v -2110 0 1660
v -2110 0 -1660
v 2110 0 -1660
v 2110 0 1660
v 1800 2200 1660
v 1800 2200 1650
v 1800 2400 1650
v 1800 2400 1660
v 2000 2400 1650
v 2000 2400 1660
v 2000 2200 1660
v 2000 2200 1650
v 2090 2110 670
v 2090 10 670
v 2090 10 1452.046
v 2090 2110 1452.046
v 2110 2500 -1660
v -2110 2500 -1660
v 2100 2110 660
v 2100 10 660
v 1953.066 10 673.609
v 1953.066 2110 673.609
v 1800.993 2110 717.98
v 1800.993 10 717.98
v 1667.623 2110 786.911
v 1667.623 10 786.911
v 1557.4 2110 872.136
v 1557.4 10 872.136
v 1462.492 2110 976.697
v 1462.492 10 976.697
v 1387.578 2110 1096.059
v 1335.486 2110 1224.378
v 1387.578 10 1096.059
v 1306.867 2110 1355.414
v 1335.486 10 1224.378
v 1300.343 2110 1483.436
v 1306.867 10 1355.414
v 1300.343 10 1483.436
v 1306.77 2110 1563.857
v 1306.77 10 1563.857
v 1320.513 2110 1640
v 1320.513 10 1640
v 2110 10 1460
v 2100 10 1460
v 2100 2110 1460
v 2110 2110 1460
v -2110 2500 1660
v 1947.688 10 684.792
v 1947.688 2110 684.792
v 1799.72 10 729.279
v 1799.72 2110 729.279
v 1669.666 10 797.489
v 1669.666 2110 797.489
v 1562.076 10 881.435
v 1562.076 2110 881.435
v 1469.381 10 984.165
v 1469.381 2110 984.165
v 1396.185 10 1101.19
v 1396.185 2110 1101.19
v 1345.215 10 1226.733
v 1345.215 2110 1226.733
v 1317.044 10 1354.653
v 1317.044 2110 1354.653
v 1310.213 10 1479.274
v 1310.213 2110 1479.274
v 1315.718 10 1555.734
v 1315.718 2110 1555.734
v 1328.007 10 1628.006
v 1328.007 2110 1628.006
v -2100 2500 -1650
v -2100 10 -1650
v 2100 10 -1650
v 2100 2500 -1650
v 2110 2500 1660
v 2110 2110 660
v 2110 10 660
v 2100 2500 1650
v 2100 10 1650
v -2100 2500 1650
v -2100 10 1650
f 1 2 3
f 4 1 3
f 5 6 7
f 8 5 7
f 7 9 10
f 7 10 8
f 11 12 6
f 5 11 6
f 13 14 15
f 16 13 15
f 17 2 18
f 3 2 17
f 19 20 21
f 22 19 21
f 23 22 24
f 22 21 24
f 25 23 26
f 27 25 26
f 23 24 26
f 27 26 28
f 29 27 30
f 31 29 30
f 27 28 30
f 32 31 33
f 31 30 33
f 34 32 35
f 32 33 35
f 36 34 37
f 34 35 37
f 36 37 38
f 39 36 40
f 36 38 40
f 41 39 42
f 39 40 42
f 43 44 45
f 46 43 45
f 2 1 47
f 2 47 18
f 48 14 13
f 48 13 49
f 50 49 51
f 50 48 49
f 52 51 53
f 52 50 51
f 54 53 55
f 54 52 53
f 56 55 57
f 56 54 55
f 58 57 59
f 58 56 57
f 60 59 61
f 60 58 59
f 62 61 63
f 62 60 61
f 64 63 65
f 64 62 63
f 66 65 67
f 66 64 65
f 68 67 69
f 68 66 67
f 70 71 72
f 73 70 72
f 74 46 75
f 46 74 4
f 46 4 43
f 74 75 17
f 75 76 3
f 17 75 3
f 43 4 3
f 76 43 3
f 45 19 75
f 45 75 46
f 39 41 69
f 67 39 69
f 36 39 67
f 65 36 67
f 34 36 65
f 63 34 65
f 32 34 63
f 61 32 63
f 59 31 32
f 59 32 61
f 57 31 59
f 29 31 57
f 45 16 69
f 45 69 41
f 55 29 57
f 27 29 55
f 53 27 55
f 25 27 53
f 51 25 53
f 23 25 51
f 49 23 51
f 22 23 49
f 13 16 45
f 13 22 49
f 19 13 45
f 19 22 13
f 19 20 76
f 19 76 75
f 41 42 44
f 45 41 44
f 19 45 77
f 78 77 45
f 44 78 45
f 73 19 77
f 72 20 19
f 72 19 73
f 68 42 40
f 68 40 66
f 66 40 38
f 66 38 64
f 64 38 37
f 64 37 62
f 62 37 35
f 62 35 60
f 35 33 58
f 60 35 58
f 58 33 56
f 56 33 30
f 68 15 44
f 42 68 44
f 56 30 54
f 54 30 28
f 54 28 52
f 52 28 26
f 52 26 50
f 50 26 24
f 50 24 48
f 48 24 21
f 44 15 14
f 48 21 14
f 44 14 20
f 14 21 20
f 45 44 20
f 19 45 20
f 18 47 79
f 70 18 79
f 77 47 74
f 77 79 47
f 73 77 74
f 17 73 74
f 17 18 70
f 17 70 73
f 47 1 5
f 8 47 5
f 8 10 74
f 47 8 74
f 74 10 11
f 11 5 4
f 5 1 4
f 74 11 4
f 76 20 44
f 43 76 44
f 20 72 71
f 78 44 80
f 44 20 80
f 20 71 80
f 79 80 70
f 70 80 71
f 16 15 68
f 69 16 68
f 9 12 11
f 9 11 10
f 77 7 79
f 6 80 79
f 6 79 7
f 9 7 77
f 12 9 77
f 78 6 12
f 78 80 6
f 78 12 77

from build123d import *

# Parameters (mm, degrees)
CROQUIS1_W              = 4220
CROQUIS1_H              = 3320
CROQUIS1_W_2            = 4200
CROQUIS1_H_2            = 3300
SALIENTE_EXTRUIR1_DEPTH = 2500
CROQUIS2_W              = 4220
CROQUIS2_H              = 3320
SALIENTE_EXTRUIR2_DEPTH = 10
CROQUIS4_W              = 800
CROQUIS4_H              = 2100
CORTAR_EXTRUIR1_DEPTH   = 5171.07736886
CROQUIS5_W              = 200
CROQUIS5_H              = 200
CORTAR_EXTRUIR2_DEPTH   = 4654.837126501
BARRER1_START           = 10
BARRER1_DEPTH           = 2100


# Read off the part's stored shape, not the designer's step: Barrer1
with BuildPart() as part:
    # Croquis1 → Saliente-Extruir1 (new body)
    with BuildSketch(Plane(origin=(0, 0, 0), x_dir=(1, 0, 0), z_dir=(0, 1, 0))):
        Rectangle(CROQUIS1_W, CROQUIS1_H)
        Rectangle(CROQUIS1_W_2, CROQUIS1_H_2, mode=Mode.SUBTRACT)
    extrude(amount=SALIENTE_EXTRUIR1_DEPTH)

    # Croquis2 → Saliente-Extruir2 (add)
    with BuildSketch(Plane(origin=(0, 0, 0), x_dir=(1, 0, 0), z_dir=(0, 1, 0))):
        Rectangle(CROQUIS2_W, CROQUIS2_H)
    extrude(amount=SALIENTE_EXTRUIR2_DEPTH)

    # Croquis4 → Cortar-Extruir1 (cut, through all)
    with BuildSketch(Plane.ZY.offset(-2100)):
        with Locations((1060, 1060)):
            Rectangle(CROQUIS4_W, CROQUIS4_H)
    extrude(amount=-CORTAR_EXTRUIR1_DEPTH, mode=Mode.SUBTRACT)

    # Croquis5 → Cortar-Extruir2 (cut, through all)
    with BuildSketch(Plane(origin=(0, 0, 1650), x_dir=(-1, 0, 0), z_dir=(0, 0, -1))):
        with Locations((-1900, 2300)):
            Rectangle(CROQUIS5_W, CROQUIS5_H)
    extrude(amount=-CORTAR_EXTRUIR2_DEPTH, mode=Mode.SUBTRACT)


with BuildPart() as body_2:
    # Barrer1 outline → Barrer1 (new body)
    with BuildSketch(Plane(origin=(0, 0, 0), x_dir=(1, 0, 0), z_dir=(0, 1, 0)).offset(BARRER1_START)):
        with BuildLine():
            Line((2100, -1460), (2100, -660))
            add(Edge.make_bspline(
                [(2100, -660), (2073.912540262, -660), (2047.205425142, -661.277427646), (1998.537748561, -666.165802924), (1971.022170868, -670.043272858), (1943.228244208, -675.488942545), (1909.594641716, -682.46904502), (1881.519722969, -689.847207107), (1837.098749393, -704.235952802), (1809.074027841, -714.316425373), (1781.256702654, -726.131802199), (1742.063038297, -743.896197944), (1714.717308152, -758.197430259), (1677.988959354, -780.261991885), (1651.543173099, -796.949389048), (1625.872718869, -815.333799698), (1585.17176187, -846.847049938), (1561.086008122, -867.886566729), (1534.439687048, -894.163886437), (1511.840013415, -916.906423496), (1490.555696644, -941.065070966), (1454.68396975, -986.164337367), (1436.128749015, -1012.493555913), (1419.272719168, -1039.747680905), (1401.813439136, -1068.129951729), (1386.732696165, -1096.332008248), (1363.911456334, -1145.843241347), (1351.948297409, -1175.047830985), (1341.81546422, -1204.593997119), (1329.503910263, -1242.502010967), (1321.722168511, -1272.364340048), (1312.848105033, -1316.456716804), (1307.708813562, -1346.214672379), (1304.29926654, -1375.766346194), (1300.436814682, -1420.406205825), (1299.564694512, -1449.42133541), (1300.351434012, -1484.672768197), (1301.347205401, -1512.960524023), (1303.802172385, -1540.618483017), (1309.878882682, -1588.271722102), (1314.643310763, -1614.581454987), (1320.512989204, -1640)],
                knots=[0, 0, 0, 0, 0.0625, 0.0625, 0.112, 0.125, 0.125, 0.1875, 0.1875, 0.224, 0.25, 0.25, 0.3125, 0.3125, 0.336, 0.375, 0.375, 0.4375, 0.4375, 0.448, 0.5, 0.5, 0.56, 0.5625, 0.5625, 0.625, 0.625, 0.67, 0.6875, 0.6875, 0.75, 0.75, 0.78, 0.8125, 0.8125, 0.875, 0.875, 0.89, 0.9375, 0.9375, 1, 1, 1, 1], degree=3))
            Line((1320.512989204, -1640), (2100, -1460))
        make_face()
        with BuildLine():
            add(Edge.make_bspline(
                [(2090, -670), (2064.849260042, -670.253192381), (2039.078864701, -671.783812407), (1992.056644326, -677.046092349), (1965.444640774, -681.096938582), (1938.521142618, -686.636168487), (1905.931004824, -693.710028058), (1878.687990861, -701.089136682), (1835.543798301, -715.38192305), (1808.310025372, -725.365883516), (1781.261316695, -737.032063098), (1743.141179806, -754.55386536), (1716.52840869, -768.630587485), (1680.764535289, -790.311377267), (1655.007631837, -806.699418418), (1629.991452554, -824.729625587), (1590.314129043, -855.615970934), (1566.820296032, -876.218466231), (1540.813402898, -901.932989718), (1518.75371452, -924.186150168), (1497.963897958, -947.811633291), (1462.905445265, -991.895874509), (1444.757140396, -1017.620300495), (1428.255239518, -1044.234065636), (1411.162048773, -1071.948896661), (1396.380313755, -1099.473954468), (1373.973000452, -1147.77467233), (1362.20848233, -1176.256185803), (1352.212083497, -1205.058563682), (1340.053182448, -1242.007707676), (1332.329364093, -1271.10188819), (1323.454846244, -1314.038121597), (1318.28729717, -1343.008645137), (1314.792753157, -1371.762738566), (1310.749302629, -1415.180945405), (1309.692563847, -1443.380551133), (1310.148118635, -1477.602145971), (1310.857013779, -1505.055789573), (1312.938576617, -1531.863881157), (1318.292334413, -1578.009379659), (1322.596830446, -1603.453489949), (1328.006576839, -1628.006412365)],
                knots=[0, 0, 0, 0, 0.0625, 0.0625, 0.112, 0.125, 0.125, 0.1875, 0.1875, 0.224, 0.25, 0.25, 0.3125, 0.3125, 0.336, 0.375, 0.375, 0.4375, 0.4375, 0.448, 0.5, 0.5, 0.56, 0.5625, 0.5625, 0.625, 0.625, 0.67, 0.6875, 0.6875, 0.75, 0.75, 0.78, 0.8125, 0.8125, 0.875, 0.875, 0.89, 0.9375, 0.9375, 1, 1, 1, 1], degree=3))
            Line((2090, -670), (2090, -1452.04605091))
            Line((2090, -1452.04605091), (1328.006576839, -1628.006412365))
        make_face(mode=Mode.SUBTRACT)
    extrude(amount=BARRER1_DEPTH)


solid = Compound([part.part, body_2.part])
